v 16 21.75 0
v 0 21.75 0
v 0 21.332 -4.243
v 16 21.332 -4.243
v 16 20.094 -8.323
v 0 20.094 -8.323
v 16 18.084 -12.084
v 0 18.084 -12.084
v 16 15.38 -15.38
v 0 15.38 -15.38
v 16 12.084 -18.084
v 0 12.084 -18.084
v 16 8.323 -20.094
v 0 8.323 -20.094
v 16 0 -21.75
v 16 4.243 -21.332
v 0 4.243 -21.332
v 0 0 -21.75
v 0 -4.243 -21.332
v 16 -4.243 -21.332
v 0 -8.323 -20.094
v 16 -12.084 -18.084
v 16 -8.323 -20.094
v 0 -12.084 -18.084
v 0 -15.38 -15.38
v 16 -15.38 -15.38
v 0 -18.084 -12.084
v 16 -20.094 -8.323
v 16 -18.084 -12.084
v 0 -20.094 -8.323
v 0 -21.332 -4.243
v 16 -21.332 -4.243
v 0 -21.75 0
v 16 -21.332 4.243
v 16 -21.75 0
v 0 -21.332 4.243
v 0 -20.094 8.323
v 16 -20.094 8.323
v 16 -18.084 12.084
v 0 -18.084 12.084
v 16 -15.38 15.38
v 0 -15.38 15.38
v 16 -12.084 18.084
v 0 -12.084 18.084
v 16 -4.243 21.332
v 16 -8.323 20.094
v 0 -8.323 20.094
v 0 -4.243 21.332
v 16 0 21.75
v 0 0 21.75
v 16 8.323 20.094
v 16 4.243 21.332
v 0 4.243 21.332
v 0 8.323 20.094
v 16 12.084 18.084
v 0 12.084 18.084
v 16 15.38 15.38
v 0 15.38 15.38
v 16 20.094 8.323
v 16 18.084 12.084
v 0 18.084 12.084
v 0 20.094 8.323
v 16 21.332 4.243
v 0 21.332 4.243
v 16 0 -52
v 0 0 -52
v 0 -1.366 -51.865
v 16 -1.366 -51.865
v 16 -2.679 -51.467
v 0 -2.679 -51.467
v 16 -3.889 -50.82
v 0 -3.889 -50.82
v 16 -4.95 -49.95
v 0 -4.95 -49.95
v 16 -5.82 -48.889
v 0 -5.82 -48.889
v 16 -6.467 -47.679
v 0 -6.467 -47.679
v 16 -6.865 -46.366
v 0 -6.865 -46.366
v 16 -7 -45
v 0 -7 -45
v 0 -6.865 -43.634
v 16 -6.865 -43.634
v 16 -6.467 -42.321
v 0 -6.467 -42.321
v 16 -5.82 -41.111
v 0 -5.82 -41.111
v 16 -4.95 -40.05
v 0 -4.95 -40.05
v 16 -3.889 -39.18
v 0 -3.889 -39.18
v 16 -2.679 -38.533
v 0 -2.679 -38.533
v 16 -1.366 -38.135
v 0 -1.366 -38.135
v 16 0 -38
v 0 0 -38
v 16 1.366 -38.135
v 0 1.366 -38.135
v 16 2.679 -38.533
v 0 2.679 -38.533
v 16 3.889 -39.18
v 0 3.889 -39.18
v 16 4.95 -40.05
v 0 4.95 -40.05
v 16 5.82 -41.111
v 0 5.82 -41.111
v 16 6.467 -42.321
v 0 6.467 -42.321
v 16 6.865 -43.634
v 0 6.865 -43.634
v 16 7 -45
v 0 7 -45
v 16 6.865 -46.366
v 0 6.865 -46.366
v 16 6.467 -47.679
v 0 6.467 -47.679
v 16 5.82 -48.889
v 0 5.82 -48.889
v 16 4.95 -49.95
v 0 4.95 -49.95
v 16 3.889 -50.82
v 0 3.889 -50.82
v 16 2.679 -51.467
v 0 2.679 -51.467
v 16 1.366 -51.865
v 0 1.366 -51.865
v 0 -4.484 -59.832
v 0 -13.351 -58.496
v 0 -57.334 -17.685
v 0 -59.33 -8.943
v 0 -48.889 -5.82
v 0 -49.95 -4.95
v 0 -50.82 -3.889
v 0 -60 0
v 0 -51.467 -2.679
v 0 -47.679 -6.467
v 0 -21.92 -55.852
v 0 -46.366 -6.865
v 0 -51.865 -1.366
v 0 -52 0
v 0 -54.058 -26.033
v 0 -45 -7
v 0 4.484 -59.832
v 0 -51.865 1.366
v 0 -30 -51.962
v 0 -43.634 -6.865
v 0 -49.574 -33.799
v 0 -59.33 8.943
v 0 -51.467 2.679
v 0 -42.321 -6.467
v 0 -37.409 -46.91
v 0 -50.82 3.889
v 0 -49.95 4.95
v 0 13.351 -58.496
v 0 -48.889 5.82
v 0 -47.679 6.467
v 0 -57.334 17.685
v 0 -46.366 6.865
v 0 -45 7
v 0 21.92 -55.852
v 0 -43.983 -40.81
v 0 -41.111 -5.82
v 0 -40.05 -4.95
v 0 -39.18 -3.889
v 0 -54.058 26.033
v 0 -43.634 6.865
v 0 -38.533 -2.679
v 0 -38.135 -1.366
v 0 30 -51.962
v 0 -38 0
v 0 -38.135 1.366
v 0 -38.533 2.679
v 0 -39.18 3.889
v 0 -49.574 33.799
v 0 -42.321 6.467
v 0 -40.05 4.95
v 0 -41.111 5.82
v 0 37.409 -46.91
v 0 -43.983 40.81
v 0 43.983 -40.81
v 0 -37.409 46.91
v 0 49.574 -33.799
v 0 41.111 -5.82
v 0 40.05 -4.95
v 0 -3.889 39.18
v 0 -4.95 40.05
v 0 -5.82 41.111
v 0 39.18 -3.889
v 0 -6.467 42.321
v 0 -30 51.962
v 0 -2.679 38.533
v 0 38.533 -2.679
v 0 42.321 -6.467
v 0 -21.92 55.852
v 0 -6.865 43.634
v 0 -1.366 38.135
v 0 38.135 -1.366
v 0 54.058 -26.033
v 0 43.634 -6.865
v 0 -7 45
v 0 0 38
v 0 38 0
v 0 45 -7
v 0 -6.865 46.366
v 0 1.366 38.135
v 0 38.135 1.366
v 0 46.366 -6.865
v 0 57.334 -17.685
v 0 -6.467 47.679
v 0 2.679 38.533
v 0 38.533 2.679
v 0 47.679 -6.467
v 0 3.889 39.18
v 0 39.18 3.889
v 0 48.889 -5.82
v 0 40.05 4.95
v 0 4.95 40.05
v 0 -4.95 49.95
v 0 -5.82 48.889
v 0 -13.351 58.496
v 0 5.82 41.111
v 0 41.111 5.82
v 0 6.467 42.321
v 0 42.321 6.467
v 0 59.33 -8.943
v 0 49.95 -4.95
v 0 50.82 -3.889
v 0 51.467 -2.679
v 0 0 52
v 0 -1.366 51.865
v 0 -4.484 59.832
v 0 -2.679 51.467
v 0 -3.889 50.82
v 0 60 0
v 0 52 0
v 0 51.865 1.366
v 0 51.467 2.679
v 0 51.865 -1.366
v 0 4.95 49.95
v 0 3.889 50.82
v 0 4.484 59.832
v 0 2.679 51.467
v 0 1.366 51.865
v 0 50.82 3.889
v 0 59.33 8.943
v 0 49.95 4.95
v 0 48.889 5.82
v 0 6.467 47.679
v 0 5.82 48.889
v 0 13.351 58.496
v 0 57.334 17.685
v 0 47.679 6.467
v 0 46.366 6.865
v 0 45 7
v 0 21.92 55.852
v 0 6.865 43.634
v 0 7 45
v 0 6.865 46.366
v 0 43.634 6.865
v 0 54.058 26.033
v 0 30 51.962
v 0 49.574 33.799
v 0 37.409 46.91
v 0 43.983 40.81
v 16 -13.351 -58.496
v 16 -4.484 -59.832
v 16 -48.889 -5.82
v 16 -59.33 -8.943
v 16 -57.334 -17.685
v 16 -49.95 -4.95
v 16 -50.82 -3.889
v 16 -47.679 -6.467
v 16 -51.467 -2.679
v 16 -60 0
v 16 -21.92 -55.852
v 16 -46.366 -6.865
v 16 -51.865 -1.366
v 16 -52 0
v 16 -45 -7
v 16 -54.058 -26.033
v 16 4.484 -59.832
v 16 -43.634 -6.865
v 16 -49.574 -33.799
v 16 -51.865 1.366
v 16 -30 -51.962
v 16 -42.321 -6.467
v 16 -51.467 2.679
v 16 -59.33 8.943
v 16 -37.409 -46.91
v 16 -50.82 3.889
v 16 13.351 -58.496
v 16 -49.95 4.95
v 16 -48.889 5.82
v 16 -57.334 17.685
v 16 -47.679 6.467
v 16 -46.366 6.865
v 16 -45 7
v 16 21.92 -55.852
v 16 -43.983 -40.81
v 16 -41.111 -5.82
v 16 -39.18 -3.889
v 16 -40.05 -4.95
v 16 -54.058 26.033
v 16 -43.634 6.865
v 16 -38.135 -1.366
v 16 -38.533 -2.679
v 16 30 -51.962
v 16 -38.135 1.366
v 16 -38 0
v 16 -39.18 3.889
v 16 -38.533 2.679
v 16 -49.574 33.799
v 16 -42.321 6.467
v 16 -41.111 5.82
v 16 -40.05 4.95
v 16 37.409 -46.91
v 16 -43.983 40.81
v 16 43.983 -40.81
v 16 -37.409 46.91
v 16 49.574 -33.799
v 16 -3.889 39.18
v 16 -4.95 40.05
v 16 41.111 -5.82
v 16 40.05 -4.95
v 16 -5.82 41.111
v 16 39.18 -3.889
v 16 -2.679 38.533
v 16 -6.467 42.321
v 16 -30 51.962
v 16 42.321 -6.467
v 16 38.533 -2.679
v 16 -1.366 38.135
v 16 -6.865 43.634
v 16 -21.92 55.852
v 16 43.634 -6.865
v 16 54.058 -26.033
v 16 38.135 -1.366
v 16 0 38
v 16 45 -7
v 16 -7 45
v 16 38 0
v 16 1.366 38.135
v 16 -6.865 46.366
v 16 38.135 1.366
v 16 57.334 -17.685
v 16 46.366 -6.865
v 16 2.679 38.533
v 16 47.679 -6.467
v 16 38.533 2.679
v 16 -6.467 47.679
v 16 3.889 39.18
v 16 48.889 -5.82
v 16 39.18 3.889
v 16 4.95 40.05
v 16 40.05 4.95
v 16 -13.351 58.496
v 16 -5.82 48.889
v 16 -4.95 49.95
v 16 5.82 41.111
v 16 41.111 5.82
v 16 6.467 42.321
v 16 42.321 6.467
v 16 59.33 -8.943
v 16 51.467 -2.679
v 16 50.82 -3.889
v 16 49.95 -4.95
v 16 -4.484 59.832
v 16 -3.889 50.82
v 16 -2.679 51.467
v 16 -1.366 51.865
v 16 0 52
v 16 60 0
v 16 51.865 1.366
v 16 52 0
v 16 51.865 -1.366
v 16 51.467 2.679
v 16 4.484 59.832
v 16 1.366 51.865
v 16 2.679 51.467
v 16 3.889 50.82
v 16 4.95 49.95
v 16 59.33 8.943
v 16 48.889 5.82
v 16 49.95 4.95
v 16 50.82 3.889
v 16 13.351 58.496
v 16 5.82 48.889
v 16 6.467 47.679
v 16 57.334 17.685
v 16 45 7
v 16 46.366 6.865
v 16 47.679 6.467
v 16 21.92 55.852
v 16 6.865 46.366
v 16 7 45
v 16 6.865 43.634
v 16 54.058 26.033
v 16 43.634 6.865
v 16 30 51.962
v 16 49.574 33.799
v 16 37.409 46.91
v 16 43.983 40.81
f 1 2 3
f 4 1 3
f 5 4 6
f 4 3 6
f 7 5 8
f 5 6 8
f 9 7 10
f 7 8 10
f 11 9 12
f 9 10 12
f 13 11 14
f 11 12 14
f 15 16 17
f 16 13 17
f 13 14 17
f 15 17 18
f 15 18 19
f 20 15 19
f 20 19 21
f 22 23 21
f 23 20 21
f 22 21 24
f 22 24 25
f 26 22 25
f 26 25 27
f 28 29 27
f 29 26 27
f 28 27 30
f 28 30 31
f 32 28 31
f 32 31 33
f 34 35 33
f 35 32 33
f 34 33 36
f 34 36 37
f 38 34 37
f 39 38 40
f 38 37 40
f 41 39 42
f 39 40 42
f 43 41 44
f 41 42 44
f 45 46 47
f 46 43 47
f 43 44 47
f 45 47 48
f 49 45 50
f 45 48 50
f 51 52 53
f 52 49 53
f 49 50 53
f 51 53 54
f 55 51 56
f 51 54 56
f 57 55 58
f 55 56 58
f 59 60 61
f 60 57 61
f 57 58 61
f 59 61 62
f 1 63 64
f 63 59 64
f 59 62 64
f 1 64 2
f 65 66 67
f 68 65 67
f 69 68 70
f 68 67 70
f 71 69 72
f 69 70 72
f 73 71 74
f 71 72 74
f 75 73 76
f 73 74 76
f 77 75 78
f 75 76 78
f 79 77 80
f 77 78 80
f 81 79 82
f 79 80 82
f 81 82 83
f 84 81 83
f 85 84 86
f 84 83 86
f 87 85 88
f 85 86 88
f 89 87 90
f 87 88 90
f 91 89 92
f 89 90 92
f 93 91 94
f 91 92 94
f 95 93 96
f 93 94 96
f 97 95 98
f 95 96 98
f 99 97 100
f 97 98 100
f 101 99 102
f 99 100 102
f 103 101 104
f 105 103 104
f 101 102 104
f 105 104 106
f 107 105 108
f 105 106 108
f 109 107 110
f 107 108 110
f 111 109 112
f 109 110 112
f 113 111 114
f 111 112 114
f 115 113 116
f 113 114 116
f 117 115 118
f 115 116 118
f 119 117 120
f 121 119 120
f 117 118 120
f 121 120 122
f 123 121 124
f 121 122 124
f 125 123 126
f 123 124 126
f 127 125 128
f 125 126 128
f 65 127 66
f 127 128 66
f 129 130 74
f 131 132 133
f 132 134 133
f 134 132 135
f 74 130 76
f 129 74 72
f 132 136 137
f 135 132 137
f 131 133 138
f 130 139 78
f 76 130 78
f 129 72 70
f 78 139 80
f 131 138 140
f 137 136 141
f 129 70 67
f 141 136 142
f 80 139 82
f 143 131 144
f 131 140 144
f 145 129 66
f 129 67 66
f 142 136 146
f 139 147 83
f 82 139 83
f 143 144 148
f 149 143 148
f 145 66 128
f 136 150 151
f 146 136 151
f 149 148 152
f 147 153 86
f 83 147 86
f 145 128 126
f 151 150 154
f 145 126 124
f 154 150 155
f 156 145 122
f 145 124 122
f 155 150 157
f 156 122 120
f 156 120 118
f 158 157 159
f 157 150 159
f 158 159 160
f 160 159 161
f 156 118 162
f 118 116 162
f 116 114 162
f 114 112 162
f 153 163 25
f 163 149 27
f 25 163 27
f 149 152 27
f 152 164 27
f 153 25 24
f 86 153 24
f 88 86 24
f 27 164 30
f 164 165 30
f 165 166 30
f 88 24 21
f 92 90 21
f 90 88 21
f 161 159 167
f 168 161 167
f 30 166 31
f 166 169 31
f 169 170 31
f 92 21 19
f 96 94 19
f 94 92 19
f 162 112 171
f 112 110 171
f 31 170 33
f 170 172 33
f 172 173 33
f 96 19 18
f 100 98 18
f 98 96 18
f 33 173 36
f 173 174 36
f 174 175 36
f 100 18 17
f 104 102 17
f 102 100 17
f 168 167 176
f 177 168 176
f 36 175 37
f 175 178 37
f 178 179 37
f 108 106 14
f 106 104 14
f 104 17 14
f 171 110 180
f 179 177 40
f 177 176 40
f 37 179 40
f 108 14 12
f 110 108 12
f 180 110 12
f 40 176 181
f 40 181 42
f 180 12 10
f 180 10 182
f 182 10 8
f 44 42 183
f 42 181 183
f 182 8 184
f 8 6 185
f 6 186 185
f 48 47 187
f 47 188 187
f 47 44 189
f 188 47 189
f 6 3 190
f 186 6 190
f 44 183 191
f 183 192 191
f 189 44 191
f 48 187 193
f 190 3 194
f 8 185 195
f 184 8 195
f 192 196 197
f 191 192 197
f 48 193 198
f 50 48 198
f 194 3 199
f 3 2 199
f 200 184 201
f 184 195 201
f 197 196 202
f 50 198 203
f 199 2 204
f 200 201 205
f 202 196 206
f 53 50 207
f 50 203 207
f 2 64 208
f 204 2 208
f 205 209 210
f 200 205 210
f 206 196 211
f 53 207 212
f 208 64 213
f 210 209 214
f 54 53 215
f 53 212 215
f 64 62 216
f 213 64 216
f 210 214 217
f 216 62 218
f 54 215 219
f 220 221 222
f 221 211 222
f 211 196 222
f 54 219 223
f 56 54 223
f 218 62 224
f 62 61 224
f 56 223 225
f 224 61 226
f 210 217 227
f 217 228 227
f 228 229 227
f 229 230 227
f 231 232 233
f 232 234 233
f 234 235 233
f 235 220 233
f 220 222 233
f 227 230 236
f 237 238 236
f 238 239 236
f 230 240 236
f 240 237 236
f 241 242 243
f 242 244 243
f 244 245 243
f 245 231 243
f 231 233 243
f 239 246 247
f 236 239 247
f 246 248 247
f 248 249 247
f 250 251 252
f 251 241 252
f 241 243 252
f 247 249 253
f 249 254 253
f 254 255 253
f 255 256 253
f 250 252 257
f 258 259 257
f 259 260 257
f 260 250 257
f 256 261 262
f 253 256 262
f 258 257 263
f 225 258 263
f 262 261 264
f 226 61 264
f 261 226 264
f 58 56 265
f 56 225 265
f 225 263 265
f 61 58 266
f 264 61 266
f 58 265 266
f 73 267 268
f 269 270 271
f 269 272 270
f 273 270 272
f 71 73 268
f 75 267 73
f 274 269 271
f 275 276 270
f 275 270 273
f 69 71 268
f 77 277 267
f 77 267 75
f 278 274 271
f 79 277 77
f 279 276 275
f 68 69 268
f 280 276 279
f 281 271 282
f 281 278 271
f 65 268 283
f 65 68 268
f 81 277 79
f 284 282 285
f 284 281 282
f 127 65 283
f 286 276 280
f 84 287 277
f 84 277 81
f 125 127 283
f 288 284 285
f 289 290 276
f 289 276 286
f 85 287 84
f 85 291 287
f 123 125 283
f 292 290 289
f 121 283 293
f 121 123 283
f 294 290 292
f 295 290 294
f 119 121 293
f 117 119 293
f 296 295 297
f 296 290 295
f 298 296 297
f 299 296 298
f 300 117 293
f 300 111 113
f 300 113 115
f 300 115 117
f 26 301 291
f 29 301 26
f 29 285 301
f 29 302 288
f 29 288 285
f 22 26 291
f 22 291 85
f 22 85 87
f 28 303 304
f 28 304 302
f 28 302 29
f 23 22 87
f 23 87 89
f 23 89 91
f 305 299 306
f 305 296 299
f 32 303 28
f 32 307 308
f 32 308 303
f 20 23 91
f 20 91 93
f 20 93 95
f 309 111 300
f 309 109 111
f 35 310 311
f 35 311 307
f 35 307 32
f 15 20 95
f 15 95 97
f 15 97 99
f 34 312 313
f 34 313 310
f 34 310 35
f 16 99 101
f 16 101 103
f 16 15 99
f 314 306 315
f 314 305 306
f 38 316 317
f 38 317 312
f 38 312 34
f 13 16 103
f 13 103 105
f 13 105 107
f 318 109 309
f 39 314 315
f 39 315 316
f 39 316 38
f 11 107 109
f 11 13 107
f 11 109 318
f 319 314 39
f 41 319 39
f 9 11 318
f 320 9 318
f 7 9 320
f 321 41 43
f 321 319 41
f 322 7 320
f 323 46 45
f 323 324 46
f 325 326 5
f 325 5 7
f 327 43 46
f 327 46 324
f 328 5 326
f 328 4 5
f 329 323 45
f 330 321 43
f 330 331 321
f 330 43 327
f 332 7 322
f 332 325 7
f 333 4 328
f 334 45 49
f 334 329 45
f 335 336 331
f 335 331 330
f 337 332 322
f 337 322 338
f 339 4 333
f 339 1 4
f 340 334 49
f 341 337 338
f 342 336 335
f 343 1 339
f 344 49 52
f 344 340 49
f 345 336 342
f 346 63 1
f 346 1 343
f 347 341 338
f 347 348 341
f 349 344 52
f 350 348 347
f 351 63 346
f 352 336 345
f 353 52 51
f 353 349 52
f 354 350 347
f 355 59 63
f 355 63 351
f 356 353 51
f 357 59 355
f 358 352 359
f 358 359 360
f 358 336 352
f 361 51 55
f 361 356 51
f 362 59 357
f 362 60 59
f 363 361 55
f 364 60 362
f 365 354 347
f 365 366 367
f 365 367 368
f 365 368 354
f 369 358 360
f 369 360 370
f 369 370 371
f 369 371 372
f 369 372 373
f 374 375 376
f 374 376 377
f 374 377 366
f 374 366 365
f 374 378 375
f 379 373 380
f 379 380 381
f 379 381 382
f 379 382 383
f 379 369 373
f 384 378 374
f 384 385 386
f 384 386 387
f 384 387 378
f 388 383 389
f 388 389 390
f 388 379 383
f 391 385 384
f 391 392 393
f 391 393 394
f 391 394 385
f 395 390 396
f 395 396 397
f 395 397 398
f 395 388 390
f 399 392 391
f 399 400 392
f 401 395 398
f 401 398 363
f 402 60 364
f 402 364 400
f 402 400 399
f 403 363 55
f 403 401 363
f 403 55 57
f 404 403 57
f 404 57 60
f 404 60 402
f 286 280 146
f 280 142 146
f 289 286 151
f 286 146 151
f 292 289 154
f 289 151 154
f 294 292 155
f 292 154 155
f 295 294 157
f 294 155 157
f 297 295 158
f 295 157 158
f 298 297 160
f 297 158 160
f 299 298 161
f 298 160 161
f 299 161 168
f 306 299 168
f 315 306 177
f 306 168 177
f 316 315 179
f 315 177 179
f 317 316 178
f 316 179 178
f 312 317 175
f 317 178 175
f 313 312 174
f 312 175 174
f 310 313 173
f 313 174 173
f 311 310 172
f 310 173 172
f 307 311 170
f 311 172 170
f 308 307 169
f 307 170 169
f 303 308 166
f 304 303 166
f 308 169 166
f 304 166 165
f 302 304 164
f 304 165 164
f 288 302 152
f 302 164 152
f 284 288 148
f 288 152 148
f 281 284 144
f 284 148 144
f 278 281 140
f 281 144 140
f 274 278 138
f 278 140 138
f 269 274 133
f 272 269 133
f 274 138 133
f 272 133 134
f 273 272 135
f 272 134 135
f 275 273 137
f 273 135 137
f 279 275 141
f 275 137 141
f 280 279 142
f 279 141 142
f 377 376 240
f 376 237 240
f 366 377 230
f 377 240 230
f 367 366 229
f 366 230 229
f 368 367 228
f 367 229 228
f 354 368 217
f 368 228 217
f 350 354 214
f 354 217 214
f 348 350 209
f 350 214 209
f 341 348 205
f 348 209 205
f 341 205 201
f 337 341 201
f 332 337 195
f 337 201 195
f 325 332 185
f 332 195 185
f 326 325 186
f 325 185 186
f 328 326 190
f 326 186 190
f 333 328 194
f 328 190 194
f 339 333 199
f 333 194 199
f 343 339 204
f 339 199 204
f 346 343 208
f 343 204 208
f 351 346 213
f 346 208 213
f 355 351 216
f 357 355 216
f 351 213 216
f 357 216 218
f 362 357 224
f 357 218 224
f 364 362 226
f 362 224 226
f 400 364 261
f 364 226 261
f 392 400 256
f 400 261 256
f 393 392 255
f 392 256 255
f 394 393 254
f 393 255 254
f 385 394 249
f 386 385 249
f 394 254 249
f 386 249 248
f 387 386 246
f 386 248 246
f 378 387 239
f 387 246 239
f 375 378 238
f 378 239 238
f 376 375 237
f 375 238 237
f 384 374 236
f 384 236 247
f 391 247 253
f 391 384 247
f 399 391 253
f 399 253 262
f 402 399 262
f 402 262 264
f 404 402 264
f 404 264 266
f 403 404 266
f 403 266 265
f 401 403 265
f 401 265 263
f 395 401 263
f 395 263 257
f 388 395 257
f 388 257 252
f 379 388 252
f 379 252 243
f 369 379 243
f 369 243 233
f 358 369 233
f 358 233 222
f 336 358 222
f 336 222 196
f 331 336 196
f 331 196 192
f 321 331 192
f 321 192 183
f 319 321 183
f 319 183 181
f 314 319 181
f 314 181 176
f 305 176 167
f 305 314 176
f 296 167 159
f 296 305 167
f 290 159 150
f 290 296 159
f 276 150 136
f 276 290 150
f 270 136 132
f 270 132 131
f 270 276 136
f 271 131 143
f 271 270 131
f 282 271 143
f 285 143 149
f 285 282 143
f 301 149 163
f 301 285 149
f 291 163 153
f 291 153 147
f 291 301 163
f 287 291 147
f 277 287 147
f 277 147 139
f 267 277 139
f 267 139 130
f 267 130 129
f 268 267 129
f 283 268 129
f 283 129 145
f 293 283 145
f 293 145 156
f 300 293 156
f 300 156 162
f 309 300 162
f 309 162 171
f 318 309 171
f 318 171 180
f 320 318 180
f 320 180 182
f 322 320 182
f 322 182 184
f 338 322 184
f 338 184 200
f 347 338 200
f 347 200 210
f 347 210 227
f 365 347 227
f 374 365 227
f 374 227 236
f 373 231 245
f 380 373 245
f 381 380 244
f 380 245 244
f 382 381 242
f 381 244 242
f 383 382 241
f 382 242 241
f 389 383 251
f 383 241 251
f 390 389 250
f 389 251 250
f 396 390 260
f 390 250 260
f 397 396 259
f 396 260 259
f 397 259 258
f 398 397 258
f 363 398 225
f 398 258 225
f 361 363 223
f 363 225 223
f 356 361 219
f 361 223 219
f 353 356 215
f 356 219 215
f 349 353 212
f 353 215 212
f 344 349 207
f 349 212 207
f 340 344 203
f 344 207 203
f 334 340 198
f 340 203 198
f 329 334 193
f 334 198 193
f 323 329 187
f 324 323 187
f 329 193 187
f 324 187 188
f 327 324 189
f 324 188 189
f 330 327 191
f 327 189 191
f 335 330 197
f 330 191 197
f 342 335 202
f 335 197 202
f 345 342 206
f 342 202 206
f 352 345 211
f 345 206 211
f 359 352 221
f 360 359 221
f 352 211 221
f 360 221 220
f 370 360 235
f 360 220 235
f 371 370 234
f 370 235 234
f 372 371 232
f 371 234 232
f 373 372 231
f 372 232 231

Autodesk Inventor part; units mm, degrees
ref_plane "YZ Plane" through (0, 0, 0) normal (1, 0, 0) x (0, 1, 0)
ref_plane "XZ Plane" through (0, 0, 0) normal (0, 1, 0) x (-1, 0, 0)
ref_plane "XY Plane" through (0, 0, 0) normal (0, 0, 1) x (1, 0, 0)
sketch "Schizzo1" plane through (0, 0, 0) normal (0, 0, 1) x (1, 0, 0)
  line L0 (0, 0) -> (22.1221, 0) construction
  line L1 (0, 0) -> (0, 21.75) construction
  line L2 (0, 60) -> (16, 60)
  line L3 (16, 60) -> (16, 21.75)
  line L4 (16, 21.75) -> (0, 21.75)
  line L5 (0, 21.75) -> (0, 60)
  dimension "d0" = 16
  dimension "d1" = 38.25
  dimension "d2" = 120
revolve "Rivoluzione1" add sketch "Schizzo1" angle 360 about axis through (0, 0, 0) along (1, 0, 0)
sketch "Schizzo2" plane through (0, 0, 0) normal (1, 0, 0) x (0, 1, 0)
  circle A0 centre (0, 0) radius 45
  circle A1 centre (45, 0) radius 7
  dimension "d4" = 90
  dimension "d5" = 14
extrude "Estrusione1" cut sketch "Schizzo2" along normal through all contours A0 A1 | A0 A1 picked at (42.7183, -1.3528) picked at (47.059, -1.8371)
pattern_circular "Serie circolare1" count 4 over 360 about axis through (8, 0, 0) along (1, 0, 0) of "Estrusione1"
properties part number "06-01-2023 flangia piccola"
